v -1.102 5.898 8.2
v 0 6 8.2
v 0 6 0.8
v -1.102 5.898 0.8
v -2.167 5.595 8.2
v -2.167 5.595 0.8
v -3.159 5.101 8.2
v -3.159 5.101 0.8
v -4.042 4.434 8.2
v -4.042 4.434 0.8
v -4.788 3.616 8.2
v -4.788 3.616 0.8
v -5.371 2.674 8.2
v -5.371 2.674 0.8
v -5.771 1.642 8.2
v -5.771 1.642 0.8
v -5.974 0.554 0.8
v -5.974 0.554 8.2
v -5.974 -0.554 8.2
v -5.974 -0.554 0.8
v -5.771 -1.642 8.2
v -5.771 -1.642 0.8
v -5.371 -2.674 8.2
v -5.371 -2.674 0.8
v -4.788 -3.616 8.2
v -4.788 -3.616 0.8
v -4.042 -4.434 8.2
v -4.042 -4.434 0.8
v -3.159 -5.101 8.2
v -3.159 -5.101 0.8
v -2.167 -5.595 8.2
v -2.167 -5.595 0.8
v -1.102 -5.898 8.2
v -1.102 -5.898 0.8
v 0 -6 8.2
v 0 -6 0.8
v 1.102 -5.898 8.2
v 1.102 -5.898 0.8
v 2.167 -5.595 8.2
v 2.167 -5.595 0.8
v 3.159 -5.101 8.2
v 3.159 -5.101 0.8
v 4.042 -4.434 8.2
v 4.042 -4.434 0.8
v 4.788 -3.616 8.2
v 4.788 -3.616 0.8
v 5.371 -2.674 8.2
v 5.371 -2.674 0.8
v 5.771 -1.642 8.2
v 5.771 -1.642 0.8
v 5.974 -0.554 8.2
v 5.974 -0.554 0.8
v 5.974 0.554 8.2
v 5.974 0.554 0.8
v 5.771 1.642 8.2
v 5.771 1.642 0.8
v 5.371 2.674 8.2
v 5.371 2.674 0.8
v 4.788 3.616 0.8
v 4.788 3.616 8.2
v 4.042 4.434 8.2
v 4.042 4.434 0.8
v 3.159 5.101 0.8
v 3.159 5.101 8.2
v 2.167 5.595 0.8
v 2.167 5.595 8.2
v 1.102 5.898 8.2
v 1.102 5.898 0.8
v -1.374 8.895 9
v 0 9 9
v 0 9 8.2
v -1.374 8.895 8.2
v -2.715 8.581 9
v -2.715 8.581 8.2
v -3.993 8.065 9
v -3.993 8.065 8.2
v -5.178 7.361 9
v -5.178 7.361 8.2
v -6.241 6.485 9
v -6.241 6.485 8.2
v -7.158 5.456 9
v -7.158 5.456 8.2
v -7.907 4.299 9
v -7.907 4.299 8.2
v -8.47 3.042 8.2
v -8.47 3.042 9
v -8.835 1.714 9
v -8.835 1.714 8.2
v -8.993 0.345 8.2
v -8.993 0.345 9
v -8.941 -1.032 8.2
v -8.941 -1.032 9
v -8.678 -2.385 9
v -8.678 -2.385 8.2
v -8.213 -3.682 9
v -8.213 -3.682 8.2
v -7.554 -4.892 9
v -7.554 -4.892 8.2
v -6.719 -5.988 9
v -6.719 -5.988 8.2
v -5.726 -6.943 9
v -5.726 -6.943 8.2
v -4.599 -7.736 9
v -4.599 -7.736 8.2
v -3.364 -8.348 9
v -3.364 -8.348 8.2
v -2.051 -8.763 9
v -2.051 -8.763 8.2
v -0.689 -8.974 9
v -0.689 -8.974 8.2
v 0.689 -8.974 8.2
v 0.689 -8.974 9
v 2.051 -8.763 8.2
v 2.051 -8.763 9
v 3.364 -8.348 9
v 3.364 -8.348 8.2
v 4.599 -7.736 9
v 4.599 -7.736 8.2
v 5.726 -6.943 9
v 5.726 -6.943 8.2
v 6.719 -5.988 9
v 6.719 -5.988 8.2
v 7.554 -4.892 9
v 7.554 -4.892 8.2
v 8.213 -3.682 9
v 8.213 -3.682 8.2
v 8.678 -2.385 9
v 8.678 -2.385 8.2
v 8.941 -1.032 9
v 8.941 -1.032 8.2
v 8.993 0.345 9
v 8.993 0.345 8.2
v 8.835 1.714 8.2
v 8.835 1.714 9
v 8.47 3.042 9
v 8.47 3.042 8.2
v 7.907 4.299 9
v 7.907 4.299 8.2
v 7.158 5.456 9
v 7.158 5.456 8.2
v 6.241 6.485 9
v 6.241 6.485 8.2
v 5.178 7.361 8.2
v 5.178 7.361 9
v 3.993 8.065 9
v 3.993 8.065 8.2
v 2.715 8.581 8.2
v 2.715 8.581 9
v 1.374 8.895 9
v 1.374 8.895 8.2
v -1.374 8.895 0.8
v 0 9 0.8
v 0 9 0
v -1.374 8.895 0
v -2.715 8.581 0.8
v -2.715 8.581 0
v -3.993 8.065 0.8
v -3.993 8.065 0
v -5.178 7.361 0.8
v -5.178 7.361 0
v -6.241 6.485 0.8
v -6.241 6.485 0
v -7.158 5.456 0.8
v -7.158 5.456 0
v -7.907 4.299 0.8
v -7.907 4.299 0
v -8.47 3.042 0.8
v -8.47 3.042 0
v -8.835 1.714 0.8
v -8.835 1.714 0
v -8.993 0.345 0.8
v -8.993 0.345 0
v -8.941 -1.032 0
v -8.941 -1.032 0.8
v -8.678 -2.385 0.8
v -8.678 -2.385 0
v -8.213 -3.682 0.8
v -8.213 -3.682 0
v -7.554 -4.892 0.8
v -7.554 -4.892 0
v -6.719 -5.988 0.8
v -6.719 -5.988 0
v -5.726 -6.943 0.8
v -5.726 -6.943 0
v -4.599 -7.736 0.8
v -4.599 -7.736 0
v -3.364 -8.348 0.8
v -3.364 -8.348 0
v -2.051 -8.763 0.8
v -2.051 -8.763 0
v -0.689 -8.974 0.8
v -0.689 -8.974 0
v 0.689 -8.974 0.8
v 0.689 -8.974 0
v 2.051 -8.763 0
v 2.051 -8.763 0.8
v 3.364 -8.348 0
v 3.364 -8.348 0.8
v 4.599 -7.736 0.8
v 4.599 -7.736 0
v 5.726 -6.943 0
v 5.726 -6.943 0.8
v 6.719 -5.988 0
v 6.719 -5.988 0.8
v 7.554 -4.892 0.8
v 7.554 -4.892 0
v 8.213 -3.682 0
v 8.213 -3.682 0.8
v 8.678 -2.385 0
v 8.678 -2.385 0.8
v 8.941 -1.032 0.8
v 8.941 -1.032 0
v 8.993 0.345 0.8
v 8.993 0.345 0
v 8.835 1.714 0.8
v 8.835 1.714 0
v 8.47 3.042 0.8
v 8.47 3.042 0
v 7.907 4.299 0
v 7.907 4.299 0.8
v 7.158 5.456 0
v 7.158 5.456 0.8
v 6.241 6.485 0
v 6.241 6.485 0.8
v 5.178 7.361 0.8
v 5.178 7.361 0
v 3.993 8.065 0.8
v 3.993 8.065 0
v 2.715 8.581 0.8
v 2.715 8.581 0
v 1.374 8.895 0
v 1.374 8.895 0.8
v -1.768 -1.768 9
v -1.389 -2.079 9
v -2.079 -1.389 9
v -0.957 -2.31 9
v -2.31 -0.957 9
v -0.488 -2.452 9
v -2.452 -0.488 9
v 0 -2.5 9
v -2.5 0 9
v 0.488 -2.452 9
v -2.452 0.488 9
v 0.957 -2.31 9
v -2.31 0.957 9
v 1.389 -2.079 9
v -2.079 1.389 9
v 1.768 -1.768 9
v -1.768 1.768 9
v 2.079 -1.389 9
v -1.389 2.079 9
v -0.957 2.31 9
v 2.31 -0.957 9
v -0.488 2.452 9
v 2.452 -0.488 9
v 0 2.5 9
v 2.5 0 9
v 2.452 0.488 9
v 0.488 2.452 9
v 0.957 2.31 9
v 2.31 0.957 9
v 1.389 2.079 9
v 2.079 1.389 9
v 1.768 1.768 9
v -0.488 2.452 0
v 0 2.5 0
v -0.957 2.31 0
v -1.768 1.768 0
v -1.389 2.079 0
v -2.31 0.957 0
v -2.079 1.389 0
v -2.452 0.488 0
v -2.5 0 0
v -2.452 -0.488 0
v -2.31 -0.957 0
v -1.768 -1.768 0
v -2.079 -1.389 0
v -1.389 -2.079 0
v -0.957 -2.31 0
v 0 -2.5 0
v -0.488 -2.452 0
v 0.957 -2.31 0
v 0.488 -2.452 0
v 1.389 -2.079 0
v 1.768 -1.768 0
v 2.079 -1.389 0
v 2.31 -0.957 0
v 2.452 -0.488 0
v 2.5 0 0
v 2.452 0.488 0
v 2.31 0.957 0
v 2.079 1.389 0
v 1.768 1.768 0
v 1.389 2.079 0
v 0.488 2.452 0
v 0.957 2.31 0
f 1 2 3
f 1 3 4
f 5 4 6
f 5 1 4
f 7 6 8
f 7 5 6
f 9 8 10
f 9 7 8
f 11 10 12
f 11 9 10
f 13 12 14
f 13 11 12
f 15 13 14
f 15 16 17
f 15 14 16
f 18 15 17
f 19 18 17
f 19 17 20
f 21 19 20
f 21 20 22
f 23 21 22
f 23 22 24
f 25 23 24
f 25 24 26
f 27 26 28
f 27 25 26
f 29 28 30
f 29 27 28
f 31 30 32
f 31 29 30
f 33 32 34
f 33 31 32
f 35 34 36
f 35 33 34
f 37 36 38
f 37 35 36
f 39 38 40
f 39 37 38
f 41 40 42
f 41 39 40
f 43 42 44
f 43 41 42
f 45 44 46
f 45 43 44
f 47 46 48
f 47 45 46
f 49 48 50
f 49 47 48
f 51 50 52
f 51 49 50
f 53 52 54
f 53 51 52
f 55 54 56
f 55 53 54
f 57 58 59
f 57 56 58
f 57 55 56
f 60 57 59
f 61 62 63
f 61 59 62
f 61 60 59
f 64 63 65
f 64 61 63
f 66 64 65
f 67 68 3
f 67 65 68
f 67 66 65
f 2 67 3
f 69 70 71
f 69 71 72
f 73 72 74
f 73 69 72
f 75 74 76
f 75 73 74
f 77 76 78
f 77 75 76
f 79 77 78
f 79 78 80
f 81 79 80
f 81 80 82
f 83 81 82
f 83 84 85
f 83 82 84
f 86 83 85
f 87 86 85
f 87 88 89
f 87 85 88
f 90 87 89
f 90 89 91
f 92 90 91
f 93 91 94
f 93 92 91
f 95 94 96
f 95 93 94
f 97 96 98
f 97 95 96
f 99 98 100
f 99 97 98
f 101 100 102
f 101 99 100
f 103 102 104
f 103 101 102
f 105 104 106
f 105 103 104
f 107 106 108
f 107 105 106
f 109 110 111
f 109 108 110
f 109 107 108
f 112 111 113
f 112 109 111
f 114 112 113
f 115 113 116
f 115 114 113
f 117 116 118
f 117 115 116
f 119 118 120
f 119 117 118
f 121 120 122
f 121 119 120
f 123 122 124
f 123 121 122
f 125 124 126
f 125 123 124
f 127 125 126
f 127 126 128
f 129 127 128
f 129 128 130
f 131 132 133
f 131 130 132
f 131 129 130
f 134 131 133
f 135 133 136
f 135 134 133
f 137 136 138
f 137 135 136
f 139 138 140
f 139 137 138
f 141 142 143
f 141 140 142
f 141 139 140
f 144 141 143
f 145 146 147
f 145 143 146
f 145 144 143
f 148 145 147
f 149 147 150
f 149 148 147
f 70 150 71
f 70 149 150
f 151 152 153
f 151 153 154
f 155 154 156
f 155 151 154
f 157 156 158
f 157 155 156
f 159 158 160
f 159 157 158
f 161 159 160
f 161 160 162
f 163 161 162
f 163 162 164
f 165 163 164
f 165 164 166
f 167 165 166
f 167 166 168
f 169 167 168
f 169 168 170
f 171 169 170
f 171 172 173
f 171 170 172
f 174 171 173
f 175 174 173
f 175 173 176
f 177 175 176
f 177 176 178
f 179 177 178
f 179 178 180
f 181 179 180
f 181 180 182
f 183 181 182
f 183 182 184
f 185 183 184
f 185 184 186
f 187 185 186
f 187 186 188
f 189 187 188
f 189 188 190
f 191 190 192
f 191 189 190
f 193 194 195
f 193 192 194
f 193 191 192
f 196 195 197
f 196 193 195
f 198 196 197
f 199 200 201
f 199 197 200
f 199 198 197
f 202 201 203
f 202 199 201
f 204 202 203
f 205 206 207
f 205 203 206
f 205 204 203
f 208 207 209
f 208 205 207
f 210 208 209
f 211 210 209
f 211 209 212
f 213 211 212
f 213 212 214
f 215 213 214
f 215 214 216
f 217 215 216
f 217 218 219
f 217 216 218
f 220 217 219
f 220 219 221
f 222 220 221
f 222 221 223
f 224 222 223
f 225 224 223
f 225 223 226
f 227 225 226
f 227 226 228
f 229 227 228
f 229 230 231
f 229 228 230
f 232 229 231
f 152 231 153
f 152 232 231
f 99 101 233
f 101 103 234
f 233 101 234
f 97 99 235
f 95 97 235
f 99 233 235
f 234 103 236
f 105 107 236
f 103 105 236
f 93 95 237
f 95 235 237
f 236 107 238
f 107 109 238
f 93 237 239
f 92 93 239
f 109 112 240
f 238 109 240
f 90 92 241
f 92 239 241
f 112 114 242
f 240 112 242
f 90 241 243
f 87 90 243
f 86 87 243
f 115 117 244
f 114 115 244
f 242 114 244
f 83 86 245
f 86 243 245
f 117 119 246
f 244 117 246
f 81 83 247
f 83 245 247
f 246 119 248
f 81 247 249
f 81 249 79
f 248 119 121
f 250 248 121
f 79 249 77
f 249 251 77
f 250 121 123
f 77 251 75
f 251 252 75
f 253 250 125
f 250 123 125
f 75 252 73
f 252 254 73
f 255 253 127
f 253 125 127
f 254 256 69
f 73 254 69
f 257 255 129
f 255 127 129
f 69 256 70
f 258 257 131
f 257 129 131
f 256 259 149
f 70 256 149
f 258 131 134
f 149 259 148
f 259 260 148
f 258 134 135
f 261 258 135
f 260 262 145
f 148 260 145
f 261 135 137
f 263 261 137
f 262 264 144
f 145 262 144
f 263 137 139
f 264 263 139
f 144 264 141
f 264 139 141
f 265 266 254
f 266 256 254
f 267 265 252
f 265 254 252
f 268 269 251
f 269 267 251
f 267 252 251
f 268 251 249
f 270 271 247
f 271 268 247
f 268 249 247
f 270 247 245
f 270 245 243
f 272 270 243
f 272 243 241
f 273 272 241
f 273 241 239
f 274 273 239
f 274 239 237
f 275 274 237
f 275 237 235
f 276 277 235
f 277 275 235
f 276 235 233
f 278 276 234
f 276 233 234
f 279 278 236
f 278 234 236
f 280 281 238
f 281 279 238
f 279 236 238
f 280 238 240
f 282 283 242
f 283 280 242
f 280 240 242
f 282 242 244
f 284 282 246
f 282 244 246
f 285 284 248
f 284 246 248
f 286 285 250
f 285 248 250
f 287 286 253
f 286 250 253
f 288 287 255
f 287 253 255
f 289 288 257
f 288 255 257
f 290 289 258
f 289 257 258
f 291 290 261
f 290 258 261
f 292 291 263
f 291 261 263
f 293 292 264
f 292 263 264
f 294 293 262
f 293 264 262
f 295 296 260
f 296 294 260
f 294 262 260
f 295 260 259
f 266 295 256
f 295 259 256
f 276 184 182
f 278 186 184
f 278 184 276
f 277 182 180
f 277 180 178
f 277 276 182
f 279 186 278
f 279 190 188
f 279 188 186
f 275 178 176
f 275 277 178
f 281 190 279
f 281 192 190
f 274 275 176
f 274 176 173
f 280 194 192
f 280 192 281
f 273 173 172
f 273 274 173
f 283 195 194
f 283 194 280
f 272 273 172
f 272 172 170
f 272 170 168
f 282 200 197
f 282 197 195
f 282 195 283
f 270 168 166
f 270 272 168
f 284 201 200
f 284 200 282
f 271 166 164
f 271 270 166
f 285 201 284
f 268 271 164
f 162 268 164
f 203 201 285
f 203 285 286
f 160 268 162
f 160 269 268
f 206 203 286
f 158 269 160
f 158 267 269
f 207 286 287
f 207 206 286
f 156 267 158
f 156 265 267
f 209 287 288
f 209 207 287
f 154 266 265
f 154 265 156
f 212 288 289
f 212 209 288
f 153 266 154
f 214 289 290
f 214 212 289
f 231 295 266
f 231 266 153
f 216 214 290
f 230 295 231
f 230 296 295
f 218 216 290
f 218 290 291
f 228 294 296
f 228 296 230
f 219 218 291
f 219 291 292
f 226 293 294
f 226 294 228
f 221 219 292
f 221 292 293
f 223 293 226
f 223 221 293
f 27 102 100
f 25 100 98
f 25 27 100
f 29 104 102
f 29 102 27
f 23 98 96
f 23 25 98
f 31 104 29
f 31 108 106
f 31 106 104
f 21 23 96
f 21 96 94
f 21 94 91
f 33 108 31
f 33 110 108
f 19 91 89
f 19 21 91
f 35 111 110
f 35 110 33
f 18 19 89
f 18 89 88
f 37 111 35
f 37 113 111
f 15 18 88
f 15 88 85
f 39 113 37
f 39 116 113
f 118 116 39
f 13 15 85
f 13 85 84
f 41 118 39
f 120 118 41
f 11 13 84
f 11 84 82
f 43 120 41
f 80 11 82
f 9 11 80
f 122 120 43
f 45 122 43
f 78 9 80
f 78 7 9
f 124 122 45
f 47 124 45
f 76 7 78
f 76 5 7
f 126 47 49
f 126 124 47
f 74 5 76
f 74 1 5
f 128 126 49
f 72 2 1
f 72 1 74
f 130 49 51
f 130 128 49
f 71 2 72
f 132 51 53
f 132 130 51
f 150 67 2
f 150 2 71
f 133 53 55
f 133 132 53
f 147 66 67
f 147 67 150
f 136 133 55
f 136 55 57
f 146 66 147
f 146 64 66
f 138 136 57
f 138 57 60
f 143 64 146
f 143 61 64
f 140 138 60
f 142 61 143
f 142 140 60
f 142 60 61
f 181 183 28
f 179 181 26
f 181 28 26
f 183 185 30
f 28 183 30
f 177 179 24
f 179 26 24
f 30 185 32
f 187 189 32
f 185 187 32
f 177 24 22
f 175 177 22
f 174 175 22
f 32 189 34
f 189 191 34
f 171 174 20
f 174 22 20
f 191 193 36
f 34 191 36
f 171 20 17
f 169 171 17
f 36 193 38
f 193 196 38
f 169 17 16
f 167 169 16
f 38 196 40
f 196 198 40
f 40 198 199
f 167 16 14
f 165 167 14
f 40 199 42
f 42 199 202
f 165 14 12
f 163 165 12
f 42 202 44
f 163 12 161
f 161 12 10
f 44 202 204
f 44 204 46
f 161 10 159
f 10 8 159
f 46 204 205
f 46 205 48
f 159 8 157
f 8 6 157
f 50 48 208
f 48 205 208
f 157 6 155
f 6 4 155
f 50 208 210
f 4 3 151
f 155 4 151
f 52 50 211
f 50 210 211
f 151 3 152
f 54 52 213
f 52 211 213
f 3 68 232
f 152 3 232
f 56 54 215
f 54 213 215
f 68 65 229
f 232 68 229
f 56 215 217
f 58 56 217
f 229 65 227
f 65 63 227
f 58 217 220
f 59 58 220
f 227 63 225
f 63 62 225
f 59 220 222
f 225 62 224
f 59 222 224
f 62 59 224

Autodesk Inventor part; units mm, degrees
ref_plane "YZ Plane" through (0, 0, 0) normal (1, 0, 0) x (0, 1, 0)
ref_plane "XZ Plane" through (0, 0, 0) normal (0, 1, 0) x (-1, 0, 0)
ref_plane "XY Plane" through (0, 0, 0) normal (0, 0, 1) x (1, 0, 0)
sketch "Sketch1" plane through (0, 0, 0) normal (1, 0, 0) x (0, 1, 0)
  line L0 (0, 0) -> (9, 0)
  line L1 (9, 0) -> (9, 9)
  line L2 (9, 9) -> (0, 9)
  line L3 (0, 9) -> (0, 0)
  line L4 (9, 8.2) -> (2.5, 8.2)
  line L5 (9, 0.8) -> (2.5, 0.8)
  line L6 (6, 0.8) -> (6, 8.2)
  line L7 (2.5, 0) -> (2.5, 9)
  dimension "d0" = 9
  dimension "d1" = 9
  dimension "d2" = 7.4
  dimension "d3" = 0.8
  dimension "d4" = 2.5
  dimension "d5" = 6
revolve "Revolution1" add sketch "Sketch1" angle 360 about axis through (0, 0, 9) along (0, 0, -1) contours L7 L5 L1 L0 | L7 L4 L6 L5 | L2 L1 L4 L7
properties part number "belt_gear_2"
